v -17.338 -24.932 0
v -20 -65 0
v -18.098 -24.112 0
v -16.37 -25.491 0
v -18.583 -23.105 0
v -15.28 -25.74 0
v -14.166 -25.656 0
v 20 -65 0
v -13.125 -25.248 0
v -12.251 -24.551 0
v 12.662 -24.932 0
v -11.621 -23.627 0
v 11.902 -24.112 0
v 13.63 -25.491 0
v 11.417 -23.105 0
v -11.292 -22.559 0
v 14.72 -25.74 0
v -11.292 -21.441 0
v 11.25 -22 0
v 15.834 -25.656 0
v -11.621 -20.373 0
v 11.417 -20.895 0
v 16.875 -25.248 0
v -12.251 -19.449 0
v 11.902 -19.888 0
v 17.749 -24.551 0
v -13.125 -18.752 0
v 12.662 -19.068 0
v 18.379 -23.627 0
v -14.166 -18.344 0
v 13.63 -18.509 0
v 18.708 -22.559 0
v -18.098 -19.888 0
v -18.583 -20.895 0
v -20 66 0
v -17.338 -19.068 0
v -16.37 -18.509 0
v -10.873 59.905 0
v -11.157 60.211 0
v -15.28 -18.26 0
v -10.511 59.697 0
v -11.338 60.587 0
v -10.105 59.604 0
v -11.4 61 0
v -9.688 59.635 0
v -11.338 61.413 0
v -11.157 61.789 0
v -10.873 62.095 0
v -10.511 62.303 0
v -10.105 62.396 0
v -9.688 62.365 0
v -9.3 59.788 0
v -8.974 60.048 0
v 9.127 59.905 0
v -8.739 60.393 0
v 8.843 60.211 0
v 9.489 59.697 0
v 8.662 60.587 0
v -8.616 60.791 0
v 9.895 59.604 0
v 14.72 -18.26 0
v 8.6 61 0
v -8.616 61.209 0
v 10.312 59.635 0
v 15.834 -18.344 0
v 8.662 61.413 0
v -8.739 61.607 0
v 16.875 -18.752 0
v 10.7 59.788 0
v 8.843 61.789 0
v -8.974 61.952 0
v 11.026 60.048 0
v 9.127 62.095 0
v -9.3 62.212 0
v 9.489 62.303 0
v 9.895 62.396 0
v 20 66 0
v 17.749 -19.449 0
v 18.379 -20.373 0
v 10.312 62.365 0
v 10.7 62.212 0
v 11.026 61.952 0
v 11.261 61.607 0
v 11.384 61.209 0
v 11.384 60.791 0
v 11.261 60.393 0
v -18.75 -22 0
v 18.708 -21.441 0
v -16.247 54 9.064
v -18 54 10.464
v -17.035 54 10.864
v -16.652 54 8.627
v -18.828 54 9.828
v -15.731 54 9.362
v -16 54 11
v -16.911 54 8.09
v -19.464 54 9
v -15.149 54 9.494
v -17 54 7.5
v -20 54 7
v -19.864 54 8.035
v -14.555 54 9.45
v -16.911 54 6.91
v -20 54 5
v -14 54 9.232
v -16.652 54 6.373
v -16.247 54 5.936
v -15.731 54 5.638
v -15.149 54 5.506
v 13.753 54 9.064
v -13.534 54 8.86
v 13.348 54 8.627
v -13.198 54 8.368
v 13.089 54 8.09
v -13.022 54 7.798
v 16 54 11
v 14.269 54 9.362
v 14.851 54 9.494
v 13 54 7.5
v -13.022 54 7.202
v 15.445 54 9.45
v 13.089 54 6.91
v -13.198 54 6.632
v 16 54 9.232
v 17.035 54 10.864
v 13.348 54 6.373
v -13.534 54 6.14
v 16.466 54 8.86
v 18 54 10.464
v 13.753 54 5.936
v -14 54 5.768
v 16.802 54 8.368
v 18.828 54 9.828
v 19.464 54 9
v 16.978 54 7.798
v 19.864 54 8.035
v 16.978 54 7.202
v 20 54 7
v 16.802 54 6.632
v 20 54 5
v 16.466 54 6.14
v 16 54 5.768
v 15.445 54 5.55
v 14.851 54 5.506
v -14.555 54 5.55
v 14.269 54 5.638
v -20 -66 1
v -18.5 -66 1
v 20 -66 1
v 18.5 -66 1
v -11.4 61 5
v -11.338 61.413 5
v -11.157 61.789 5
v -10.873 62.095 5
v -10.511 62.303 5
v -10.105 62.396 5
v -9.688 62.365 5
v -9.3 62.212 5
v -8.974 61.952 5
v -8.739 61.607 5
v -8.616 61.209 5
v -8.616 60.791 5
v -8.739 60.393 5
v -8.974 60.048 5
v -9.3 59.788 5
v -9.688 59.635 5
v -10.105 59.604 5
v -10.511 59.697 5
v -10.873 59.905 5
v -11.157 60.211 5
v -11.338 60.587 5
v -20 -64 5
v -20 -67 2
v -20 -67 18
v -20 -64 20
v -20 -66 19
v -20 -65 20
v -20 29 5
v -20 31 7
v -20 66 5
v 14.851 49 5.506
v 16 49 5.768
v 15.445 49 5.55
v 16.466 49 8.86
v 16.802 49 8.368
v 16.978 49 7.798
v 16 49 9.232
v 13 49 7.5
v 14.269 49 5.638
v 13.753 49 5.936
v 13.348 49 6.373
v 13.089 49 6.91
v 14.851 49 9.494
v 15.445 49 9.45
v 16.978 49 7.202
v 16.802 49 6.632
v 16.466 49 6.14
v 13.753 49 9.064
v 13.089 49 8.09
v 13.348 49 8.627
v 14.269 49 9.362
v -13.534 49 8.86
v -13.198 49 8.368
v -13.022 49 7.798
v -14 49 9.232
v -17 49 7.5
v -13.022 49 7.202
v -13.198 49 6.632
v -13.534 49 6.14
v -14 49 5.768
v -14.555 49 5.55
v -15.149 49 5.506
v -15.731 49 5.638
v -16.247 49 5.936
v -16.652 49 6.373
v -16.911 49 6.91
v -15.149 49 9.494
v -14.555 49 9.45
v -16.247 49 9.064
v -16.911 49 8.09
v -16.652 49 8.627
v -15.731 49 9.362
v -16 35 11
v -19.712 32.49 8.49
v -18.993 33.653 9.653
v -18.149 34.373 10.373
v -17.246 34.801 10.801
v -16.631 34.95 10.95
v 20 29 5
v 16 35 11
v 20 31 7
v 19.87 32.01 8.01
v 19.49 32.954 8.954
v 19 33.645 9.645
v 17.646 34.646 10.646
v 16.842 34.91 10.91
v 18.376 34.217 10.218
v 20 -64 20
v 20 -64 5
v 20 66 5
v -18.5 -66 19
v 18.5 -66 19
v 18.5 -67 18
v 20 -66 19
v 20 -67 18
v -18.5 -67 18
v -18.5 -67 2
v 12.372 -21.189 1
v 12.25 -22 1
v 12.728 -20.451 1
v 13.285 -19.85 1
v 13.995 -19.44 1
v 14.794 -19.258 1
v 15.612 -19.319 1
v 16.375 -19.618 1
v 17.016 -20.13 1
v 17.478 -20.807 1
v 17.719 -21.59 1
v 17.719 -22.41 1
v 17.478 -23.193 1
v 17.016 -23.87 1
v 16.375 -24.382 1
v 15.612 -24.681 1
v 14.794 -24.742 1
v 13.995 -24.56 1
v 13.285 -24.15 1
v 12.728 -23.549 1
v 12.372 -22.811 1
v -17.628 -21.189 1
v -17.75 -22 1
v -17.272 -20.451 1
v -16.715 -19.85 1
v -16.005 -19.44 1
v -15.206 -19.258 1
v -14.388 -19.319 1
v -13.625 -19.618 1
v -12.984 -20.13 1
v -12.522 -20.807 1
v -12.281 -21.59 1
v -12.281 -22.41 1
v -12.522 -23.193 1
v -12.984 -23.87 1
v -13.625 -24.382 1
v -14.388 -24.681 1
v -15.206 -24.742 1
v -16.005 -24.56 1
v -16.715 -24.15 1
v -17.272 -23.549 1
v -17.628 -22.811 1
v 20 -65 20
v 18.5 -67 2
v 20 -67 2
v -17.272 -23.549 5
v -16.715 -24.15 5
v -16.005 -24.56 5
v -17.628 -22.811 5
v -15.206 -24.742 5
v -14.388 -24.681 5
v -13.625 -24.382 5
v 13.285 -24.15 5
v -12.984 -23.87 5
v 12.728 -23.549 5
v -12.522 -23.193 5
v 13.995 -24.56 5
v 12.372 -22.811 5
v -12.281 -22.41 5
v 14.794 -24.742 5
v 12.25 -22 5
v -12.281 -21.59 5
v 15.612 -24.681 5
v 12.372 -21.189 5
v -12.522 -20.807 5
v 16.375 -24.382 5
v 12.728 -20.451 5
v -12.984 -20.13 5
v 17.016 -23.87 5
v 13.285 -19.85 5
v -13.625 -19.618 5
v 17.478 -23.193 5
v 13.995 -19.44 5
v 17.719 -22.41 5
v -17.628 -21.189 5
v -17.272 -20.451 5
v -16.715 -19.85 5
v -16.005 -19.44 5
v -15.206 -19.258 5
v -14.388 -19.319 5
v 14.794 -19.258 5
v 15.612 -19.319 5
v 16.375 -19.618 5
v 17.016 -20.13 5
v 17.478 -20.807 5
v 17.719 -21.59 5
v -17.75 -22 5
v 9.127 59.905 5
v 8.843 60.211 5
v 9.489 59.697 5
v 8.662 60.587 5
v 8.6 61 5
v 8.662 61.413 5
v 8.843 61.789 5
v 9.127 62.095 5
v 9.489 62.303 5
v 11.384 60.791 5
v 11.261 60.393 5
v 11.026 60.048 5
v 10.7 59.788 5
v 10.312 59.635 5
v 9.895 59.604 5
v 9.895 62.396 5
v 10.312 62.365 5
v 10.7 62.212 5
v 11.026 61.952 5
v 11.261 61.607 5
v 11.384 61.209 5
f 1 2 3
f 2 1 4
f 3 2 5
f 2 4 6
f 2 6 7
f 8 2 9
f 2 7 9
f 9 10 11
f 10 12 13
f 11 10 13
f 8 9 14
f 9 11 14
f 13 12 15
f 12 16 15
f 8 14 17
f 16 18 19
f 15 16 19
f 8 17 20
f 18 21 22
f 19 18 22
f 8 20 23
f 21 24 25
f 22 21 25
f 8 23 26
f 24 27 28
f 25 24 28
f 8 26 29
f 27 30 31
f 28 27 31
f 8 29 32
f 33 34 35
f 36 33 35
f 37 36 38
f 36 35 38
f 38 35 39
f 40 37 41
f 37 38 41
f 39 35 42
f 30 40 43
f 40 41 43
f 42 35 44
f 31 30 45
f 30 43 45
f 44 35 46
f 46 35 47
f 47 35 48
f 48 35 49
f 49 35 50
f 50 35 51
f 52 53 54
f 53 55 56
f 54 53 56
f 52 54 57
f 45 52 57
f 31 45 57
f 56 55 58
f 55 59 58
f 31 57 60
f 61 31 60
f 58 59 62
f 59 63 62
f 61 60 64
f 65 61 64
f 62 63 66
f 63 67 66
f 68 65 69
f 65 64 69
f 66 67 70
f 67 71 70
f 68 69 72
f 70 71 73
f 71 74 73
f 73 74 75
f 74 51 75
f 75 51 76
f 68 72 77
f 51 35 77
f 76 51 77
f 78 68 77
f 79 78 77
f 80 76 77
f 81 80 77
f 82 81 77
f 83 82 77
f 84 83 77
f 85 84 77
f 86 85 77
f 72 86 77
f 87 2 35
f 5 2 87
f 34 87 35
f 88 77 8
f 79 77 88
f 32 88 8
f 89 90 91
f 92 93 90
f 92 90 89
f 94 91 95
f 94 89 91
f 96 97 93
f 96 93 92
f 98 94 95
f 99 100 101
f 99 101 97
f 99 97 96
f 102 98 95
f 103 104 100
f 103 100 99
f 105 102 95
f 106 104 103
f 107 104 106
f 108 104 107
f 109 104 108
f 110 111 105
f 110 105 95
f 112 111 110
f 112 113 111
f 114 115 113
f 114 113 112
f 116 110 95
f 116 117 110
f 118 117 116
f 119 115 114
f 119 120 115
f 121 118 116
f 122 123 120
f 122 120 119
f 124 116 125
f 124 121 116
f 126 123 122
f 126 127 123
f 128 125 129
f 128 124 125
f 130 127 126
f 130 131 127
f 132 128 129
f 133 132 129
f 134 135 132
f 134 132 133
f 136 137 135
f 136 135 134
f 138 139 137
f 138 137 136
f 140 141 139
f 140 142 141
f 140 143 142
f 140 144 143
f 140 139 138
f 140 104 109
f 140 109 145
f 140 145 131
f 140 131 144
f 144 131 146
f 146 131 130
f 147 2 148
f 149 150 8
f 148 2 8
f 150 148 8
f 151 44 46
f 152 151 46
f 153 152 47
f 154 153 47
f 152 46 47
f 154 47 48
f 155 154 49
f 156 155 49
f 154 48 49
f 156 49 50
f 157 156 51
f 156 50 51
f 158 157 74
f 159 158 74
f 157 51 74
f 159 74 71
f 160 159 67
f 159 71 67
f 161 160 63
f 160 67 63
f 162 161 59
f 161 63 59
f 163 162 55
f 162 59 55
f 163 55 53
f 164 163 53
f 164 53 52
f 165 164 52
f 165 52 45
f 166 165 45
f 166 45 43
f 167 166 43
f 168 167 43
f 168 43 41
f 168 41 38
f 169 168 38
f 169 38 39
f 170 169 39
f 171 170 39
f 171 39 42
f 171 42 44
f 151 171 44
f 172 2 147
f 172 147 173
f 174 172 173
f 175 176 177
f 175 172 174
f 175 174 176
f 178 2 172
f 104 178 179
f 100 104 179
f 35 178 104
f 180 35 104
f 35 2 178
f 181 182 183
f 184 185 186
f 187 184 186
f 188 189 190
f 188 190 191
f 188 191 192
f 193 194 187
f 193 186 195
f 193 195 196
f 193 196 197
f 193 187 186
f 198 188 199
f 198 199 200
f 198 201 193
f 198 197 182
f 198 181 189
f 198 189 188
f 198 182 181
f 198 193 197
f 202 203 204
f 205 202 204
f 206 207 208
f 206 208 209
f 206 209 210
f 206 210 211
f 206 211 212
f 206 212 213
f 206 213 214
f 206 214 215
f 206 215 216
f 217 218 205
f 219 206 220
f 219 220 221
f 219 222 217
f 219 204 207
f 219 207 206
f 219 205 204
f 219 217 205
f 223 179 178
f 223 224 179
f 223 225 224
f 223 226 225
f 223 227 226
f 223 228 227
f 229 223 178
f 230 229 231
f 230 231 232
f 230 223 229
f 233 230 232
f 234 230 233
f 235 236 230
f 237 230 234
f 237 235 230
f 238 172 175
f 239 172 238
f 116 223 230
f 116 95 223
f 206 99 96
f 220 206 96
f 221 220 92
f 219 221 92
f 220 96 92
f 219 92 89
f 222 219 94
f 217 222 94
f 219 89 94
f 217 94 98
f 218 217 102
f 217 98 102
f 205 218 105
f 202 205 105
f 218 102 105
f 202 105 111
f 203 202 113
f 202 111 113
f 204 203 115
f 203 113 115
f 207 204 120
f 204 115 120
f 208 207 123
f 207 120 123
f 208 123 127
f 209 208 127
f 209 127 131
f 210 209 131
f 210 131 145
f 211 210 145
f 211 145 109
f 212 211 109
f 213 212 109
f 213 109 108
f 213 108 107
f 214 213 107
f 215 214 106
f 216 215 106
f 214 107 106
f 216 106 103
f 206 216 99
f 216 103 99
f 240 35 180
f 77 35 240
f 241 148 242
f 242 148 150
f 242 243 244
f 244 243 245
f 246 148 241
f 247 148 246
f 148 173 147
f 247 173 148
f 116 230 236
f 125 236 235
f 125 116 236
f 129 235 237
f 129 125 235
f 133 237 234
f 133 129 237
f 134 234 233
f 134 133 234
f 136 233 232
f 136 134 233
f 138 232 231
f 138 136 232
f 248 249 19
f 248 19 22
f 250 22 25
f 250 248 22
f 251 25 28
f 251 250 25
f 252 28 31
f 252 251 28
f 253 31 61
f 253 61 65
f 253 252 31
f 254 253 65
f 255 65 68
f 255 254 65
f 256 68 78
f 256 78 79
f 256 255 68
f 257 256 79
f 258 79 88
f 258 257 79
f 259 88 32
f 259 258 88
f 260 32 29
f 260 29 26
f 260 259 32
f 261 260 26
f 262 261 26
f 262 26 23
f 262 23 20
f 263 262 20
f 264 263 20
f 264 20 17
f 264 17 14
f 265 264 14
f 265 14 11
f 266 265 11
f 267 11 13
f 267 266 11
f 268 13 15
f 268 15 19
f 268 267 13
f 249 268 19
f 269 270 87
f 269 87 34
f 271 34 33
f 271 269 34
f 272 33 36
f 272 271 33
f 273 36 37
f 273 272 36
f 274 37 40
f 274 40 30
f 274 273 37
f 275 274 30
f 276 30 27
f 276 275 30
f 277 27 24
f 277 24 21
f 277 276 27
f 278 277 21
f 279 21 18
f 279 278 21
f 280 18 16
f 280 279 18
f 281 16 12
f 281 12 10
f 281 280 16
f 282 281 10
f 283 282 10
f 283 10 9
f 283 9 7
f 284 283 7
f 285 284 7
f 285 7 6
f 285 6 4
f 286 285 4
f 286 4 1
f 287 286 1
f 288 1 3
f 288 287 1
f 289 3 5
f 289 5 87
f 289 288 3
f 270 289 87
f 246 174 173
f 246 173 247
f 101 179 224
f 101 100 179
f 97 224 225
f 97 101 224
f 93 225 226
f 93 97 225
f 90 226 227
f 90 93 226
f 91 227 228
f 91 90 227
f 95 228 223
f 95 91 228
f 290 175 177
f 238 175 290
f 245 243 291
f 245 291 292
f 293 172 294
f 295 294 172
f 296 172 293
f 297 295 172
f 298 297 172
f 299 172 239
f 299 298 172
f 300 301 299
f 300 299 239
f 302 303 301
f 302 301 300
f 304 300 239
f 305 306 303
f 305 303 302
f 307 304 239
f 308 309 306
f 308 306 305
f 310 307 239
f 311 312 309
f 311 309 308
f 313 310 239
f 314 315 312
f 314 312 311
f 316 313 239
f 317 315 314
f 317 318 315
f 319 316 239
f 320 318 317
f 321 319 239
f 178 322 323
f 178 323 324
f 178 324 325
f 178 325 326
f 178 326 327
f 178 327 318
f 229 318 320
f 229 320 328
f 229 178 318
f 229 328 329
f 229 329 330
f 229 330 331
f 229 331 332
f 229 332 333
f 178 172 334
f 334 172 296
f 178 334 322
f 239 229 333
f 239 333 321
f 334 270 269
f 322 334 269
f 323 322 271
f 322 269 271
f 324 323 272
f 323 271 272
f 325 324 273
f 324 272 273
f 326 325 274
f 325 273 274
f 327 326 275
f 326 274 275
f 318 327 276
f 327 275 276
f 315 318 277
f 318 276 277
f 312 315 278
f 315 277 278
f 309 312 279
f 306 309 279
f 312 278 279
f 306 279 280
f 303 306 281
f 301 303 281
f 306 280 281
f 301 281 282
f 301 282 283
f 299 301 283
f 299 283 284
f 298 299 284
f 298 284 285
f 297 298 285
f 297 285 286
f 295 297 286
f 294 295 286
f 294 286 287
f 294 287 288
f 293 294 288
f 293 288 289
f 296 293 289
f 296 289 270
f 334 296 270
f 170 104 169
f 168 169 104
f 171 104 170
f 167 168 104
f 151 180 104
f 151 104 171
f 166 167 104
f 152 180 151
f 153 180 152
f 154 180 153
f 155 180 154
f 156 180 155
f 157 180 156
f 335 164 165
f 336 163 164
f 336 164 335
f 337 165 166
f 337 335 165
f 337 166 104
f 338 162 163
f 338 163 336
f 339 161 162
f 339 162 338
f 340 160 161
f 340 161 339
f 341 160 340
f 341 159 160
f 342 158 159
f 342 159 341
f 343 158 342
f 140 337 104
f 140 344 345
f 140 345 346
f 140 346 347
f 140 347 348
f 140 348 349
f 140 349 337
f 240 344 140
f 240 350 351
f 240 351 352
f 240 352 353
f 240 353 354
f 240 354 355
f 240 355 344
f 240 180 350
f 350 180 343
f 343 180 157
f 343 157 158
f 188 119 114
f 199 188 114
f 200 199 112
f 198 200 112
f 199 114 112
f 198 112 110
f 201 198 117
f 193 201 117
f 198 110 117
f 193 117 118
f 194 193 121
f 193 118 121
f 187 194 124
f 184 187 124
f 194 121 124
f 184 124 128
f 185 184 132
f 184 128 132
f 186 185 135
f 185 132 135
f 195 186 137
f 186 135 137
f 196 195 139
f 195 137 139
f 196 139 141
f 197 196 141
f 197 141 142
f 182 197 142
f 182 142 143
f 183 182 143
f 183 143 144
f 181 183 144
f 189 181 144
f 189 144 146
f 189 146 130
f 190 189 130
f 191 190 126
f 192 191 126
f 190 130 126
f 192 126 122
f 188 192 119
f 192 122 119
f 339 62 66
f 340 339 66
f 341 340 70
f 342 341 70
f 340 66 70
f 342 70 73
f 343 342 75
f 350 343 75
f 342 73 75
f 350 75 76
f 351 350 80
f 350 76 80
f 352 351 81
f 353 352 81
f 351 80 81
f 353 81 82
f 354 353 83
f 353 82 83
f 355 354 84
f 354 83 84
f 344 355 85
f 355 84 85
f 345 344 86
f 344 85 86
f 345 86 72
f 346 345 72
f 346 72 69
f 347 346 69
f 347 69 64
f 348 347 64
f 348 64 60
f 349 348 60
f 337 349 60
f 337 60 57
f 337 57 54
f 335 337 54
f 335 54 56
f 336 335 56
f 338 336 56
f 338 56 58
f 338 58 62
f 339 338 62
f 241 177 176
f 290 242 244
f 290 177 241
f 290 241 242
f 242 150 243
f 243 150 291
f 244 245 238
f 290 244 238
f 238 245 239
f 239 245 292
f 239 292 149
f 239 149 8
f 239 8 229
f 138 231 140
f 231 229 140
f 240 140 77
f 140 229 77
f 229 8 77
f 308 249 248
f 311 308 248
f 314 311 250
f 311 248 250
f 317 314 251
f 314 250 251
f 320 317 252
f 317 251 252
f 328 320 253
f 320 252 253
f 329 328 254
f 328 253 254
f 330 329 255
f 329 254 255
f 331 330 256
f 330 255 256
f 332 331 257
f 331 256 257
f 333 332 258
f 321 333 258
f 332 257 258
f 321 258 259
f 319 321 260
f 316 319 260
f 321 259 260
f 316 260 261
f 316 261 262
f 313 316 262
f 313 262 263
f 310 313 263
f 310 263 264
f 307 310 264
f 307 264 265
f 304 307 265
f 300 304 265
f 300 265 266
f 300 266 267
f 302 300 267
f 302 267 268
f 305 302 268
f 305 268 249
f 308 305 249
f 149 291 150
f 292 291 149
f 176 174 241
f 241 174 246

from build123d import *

# Parameters (mm, degrees)
F0_W      = 40
F0_H      = 131.9999998143
F1_DEPTH  = 5
F2_W      = 40
F2_H      = 2
F3_DEPTH  = 15
F4_D      = 5.5
F4_DEPTH  = 8
F4_TIP    = 1.6523667023
F5_SIZE   = 1
F6_W      = 40
F6_H      = 25
F7_DEPTH  = 6
F8_R      = 2
F9_DEPTH  = 5
F10_SIZE  = 5.99999
F11_R     = 4
F12_D     = 2.8
F12_DEPTH = 8
F12_TIP   = 0.8412048666
F13_W     = 1.5
F13_H     = 18
F14_DEPTH = 1
F15_SIZE  = 0.99999


# Not quite as in the source:
# - a fillet or chamfer is up to 0.001 mm smaller than in the source, because OpenCascade refuses the exact size


with BuildPart() as f1:
    # F0 (on Top) → F1 (new body)
    with BuildSketch(Plane.XY):
        with Locations((0, 9.28e-08)):
            Rectangle(F0_W, F0_H)
    extrude(amount=F1_DEPTH)

    # F2 (on face) → F3 (join)
    with BuildSketch(Plane.XY.offset(5)):
        with Locations((0, -64.9999998143)):
            Rectangle(F2_W, F2_H)
    extrude(amount=F3_DEPTH)

    # F4
    with Locations(Plane.XY.offset(5)):
        with Locations((-15, -21.9999998143), (15, -21.9999998143)):
            Hole(F4_D / 2, depth=F4_DEPTH)
            with Locations((0, 0, -(F4_DEPTH + F4_TIP / 2))):  # 118° drill point
                Cone(0, F4_D / 2, F4_TIP, mode=Mode.SUBTRACT)

    # F5
    f5_edges = [f1.edges().sort_by_distance(p)[0] for p in [
        (0, -66, 20),
        (0, -66, 0),
        (-17.75, -22, 0),
        (12.25, -22, 0),
    ]]
    chamfer(f5_edges, length=F5_SIZE)

    # F6 (on face) → F7 (join)
    with BuildSketch(Plane.XY.offset(5)):
        with Locations((0, 41.5)):
            Rectangle(F6_W, F6_H)
    extrude(amount=F7_DEPTH)

    # F8 (on face) → F9 (cut)
    with BuildSketch(Plane(origin=(0, 54, 0), x_dir=(-1, 0, 0), z_dir=(0, 1, 0))):
        with Locations((-15, 7.5)):
            Circle(F8_R)
        with Locations((15, 7.5)):
            Circle(F8_R)
    extrude(amount=-F9_DEPTH, mode=Mode.SUBTRACT)

    # F10 (size 6 in the source; OpenCascade refuses exactly that, so slightly less here)
    f10_edges = [f1.edges().sort_by_distance(p)[0] for p in [
        (0, 29, 11),
    ]]
    chamfer(f10_edges, length=F10_SIZE)

    # F11
    f11_edges = [f1.edges().sort_by_distance(p)[0] for p in [
        (-20, 44.499995, 11),
        (20, 44.499995, 11),
    ]]
    fillet(f11_edges, radius=F11_R)

    # F12
    with Locations(Plane.XY.offset(5)):
        with Locations((10, 61), (-10, 61)):
            Hole(F12_D / 2, depth=F12_DEPTH)
            with Locations((0, 0, -(F12_DEPTH + F12_TIP / 2))):  # 118° drill point
                Cone(0, F12_D / 2, F12_TIP, mode=Mode.SUBTRACT)

    # F13 (on face) → F14 (join)
    with BuildSketch(Plane.XZ.offset(65.9999998143)):
        with Locations((-19.25, 10)):
            Rectangle(F13_W, F13_H)
        with Locations((19.25, 10)):
            Rectangle(F13_W, F13_H)
    extrude(amount=F14_DEPTH)

    # F15 (size 1 in the source; OpenCascade refuses exactly that, so slightly less here)
    f15_edges = [f1.edges().sort_by_distance(p)[0] for p in [
        (-19.25, -67, 19),
        (-19.25, -67, 1),
        (19.25, -67, 19),
        (19.25, -67, 1),
    ]]
    chamfer(f15_edges, length=F15_SIZE)


solid = f1.part
